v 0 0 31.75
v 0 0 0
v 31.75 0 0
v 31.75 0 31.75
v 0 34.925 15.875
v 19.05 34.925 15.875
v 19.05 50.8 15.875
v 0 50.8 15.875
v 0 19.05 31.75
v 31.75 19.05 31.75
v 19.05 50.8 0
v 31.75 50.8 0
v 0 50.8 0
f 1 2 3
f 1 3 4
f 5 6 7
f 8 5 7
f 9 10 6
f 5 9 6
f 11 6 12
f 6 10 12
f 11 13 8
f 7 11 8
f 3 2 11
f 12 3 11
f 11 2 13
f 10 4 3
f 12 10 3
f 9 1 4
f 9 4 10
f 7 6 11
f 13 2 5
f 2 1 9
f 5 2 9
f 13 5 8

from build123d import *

# Parameters (mm, degrees)
F0_W     = 50.8
F0_H     = 31.75
F1_DEPTH = 31.75
F3_DEPTH = 12.7
F5_DEPTH = 50.8
F7_DEPTH = 25.4


# Not quite as in the source:
# - a feature of the source that left no trace in its solid (it failed there, or was rolled back) is left out


with BuildPart() as f1:
    # F0 (on Right) → F1 (new body)
    with BuildSketch(Plane.YZ):
        with Locations((25.4, 15.875)):
            Rectangle(F0_W, F0_H)
    extrude(amount=F1_DEPTH)

    # F2 (on face) → F3 (cut)
    with BuildSketch(Plane.YZ.offset(31.75)):
        Polygon((19.05, 31.75), (50.8, 0), (50.8, 31.75), align=None)
    extrude(amount=-F3_DEPTH, mode=Mode.SUBTRACT)

    # F4 (on face) → F5 (cut)
    with BuildSketch(Plane.YZ.offset(19.05)):
        Polygon((19.05, 31.75), (34.925, 15.875), (38.1, 31.75), align=None)
    extrude(amount=-F5_DEPTH, mode=Mode.SUBTRACT)

    # F6 (on face) → F7 (cut)
    with BuildSketch(Plane.YZ.offset(19.05)):
        Polygon((38.1, 31.75), (34.925, 15.875), (50.8, 15.875), (50.8, 31.2204860245), align=None)
        Polygon((50.8, 31.75), (38.1, 31.75), (50.8, 31.2204860245), align=None)
    extrude(amount=-F7_DEPTH, mode=Mode.SUBTRACT)


solid = f1.part
